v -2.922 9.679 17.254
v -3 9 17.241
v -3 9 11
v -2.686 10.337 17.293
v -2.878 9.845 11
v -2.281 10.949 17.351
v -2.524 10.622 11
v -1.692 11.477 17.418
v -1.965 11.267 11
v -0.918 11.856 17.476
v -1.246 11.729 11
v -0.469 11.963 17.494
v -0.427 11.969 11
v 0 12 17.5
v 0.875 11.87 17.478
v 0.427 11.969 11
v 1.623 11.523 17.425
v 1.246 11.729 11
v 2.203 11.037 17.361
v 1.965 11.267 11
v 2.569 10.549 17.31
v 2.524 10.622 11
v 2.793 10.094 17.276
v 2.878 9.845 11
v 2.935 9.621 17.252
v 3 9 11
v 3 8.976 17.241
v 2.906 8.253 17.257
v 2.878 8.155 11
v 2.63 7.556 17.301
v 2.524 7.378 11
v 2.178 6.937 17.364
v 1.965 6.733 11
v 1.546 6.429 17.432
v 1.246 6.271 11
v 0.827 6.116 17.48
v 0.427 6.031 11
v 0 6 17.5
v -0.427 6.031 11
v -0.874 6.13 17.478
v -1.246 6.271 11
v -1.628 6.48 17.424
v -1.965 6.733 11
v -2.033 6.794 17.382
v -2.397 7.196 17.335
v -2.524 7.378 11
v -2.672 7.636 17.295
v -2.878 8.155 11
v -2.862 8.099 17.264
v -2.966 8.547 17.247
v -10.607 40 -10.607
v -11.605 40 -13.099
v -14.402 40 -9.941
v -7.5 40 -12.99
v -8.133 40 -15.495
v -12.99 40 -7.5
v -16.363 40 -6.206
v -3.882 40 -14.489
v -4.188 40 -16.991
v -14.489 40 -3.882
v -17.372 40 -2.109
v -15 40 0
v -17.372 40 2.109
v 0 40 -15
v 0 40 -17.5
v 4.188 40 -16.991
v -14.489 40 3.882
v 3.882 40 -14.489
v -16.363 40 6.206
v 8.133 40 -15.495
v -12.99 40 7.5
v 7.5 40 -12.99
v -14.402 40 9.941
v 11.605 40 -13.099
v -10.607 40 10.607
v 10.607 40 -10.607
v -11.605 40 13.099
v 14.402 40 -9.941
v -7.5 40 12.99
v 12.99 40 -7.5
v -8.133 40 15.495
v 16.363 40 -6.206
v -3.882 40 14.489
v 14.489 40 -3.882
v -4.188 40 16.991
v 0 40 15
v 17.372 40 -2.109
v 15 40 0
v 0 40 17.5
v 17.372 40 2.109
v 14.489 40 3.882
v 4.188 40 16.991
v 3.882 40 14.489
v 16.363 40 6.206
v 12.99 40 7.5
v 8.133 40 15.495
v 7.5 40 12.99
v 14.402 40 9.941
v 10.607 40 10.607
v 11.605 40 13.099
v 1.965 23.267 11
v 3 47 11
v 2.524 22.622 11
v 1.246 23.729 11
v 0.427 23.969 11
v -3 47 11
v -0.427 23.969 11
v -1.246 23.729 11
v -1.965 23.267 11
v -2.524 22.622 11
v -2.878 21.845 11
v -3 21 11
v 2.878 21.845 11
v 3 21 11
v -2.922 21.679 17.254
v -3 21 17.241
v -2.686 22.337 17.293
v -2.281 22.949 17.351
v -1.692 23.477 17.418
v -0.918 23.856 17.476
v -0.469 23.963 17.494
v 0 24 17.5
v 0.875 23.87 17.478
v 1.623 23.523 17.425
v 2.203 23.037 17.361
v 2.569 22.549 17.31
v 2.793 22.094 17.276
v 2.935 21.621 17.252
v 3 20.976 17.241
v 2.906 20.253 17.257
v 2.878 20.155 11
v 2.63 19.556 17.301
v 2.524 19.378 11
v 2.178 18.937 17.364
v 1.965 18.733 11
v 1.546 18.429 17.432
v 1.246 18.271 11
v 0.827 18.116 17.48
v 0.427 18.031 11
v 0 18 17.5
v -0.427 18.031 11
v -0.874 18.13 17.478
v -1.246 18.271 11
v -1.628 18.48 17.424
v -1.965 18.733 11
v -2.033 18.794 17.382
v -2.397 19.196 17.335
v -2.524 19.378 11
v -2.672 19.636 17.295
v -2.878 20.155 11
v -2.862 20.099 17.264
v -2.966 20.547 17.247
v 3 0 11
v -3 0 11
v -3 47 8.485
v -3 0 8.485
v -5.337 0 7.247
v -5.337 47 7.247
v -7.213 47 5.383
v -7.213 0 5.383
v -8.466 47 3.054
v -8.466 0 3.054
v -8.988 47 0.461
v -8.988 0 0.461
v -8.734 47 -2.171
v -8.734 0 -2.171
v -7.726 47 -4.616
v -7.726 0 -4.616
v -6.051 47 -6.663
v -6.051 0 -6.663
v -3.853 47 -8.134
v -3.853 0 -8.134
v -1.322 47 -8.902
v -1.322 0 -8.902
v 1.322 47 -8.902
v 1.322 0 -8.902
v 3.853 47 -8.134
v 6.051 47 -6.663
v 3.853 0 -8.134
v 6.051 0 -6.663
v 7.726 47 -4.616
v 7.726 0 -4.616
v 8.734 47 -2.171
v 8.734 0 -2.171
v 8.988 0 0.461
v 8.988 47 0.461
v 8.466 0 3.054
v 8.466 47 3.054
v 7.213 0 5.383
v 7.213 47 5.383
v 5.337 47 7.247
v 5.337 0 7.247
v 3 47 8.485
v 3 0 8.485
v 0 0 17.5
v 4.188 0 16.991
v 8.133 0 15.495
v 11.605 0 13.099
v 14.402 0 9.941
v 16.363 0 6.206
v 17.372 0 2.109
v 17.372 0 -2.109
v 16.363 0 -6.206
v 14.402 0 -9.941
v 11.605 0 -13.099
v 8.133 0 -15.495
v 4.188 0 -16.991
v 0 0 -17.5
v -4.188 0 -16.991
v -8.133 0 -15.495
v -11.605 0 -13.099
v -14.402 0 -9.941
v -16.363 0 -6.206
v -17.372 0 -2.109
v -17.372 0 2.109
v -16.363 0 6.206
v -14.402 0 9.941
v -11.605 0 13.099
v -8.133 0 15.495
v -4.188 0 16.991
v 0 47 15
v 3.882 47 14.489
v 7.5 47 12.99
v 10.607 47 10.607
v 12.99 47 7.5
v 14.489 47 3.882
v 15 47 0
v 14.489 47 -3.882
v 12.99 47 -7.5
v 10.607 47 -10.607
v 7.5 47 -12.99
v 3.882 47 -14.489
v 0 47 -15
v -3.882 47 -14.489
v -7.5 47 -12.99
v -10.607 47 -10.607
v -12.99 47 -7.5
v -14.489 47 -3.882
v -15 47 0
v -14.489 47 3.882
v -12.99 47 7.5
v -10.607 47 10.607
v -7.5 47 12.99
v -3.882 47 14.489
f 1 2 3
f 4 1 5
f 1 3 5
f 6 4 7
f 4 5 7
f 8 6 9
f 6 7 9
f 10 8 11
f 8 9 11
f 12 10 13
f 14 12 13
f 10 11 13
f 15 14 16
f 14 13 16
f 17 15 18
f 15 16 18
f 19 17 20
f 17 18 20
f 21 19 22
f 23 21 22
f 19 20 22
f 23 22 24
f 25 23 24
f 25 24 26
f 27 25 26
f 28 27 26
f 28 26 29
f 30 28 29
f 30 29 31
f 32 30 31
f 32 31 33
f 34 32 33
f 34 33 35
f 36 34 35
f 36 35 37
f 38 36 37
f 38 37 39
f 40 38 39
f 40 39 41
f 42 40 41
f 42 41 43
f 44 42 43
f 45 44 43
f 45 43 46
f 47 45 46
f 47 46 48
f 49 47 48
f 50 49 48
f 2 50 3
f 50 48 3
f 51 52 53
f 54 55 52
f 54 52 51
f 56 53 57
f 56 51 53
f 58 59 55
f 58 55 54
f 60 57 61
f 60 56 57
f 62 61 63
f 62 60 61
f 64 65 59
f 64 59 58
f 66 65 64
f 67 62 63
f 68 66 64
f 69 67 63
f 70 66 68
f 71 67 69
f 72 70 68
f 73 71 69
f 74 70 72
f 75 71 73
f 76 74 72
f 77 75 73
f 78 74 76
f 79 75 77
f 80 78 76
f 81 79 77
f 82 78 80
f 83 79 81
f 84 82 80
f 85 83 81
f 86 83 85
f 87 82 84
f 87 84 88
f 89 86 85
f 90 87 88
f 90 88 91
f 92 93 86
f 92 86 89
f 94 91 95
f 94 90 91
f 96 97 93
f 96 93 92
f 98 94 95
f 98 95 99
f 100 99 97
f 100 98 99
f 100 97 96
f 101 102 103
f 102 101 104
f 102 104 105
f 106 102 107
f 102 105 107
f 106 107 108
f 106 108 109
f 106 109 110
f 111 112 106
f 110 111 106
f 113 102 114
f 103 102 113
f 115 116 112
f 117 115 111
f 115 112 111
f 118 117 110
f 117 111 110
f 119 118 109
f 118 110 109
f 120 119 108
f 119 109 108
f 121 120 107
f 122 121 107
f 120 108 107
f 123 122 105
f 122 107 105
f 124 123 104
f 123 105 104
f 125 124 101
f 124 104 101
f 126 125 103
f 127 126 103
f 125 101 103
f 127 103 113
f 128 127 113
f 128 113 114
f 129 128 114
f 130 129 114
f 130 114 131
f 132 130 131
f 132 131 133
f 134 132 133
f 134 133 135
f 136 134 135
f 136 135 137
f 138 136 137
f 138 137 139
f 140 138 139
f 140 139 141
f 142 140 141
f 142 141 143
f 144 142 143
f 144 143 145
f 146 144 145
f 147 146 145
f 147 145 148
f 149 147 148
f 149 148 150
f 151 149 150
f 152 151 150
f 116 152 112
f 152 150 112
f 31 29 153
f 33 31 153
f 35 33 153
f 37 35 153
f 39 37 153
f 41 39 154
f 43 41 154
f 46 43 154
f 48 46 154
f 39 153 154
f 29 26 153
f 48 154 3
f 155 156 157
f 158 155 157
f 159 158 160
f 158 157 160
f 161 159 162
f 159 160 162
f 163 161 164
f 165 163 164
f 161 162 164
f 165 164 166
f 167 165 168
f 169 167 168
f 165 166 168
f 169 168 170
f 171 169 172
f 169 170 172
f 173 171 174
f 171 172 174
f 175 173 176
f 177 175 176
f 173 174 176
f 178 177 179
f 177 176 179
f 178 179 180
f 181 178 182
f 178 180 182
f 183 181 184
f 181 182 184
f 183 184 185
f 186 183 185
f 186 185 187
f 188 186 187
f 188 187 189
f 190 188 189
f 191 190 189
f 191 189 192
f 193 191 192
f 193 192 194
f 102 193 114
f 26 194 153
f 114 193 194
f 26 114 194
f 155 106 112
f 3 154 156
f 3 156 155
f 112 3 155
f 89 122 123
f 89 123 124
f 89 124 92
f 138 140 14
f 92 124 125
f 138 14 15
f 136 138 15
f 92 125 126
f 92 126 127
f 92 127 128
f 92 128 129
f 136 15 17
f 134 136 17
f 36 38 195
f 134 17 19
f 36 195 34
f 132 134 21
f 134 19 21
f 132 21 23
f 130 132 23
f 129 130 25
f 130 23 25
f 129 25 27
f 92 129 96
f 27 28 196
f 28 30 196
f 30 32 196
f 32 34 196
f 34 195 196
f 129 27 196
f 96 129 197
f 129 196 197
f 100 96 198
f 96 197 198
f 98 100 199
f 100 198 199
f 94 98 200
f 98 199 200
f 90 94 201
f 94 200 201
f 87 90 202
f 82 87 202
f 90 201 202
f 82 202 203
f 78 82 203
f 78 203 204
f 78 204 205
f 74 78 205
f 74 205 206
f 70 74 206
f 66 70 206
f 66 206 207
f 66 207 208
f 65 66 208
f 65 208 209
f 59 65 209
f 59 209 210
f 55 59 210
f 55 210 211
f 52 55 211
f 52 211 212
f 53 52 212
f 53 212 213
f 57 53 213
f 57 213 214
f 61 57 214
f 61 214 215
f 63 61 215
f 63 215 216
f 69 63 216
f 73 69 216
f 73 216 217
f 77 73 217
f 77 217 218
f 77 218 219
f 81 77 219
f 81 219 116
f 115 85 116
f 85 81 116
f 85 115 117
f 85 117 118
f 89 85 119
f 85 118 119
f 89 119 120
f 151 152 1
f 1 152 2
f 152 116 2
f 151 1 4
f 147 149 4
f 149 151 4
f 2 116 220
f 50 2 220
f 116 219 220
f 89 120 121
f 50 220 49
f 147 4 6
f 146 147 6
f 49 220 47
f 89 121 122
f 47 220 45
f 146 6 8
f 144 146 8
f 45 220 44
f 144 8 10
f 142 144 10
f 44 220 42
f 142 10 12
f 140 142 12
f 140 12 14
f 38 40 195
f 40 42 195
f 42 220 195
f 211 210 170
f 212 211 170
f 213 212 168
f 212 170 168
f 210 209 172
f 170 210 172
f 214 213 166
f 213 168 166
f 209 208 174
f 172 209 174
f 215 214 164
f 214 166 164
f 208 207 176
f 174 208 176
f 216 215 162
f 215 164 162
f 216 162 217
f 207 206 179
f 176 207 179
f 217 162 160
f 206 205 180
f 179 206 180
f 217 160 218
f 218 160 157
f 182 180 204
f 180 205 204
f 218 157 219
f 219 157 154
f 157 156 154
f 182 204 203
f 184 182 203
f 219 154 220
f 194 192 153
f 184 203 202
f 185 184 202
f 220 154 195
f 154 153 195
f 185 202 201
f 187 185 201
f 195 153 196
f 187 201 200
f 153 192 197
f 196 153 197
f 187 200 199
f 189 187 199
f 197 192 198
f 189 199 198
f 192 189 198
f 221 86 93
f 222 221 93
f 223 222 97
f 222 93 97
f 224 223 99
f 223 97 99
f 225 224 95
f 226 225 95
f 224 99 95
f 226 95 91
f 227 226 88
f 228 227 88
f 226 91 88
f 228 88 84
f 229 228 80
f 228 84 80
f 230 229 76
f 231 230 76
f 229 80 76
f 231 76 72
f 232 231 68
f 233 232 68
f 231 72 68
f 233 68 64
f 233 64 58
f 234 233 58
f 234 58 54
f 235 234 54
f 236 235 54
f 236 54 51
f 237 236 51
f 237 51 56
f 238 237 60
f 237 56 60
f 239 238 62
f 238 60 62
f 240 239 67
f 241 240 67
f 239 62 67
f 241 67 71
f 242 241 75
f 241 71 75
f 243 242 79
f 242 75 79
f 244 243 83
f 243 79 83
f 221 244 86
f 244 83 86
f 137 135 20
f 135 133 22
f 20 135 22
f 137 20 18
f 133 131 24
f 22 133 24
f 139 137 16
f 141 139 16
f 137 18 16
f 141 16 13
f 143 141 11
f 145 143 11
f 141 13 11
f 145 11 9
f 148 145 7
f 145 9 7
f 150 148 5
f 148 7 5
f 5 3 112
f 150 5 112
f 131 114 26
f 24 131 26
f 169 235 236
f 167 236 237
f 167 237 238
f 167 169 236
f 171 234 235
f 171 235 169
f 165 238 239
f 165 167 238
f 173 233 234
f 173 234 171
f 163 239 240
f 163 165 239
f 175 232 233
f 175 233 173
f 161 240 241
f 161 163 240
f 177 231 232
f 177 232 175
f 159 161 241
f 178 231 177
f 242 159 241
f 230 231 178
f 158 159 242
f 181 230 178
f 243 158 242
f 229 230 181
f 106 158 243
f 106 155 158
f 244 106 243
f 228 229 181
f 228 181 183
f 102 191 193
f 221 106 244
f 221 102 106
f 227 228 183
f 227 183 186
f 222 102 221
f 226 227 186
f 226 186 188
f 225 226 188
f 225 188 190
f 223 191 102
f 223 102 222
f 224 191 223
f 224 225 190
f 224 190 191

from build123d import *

# Parameters (mm, degrees)
SKETCH1_R               = 17.5
BOSS_EXTRUDE1_DEPTH     = 47
CUT_EXTRUDE1_START      = -7
SKETCH2_R               = 17.5
SKETCH2_R_2             = 15
CUT_EXTRUDE1_DEPTH      = 7
CUT_EXTRUDE2_DEPTH      = 54.117793629
CUT_EXTRUDE3_REACH      = 59.684
CUT_EXTRUDE3_END_RADIUS = 17.5
SKETCH4_R               = 3


with BuildPart() as part:
    # Sketch1 → Boss-Extrude1 (new body)
    with BuildSketch(Plane(origin=(0, 0, 0), x_dir=(1, 0, 0), z_dir=(0, 1, 0))):
        with Locations(Location((0, 0, 0), (0, 0, 270))):
            Circle(SKETCH1_R)
    extrude(amount=BOSS_EXTRUDE1_DEPTH)

    # Sketch2 → Cut-Extrude1 (cut)
    with BuildSketch(Plane(origin=(0, 47, 0), x_dir=(1, 0, 0), z_dir=(0, 1, 0)).offset(CUT_EXTRUDE1_START)):
        with Locations(Location((0, 0, 0), (0, 0, 270))):
            Circle(SKETCH2_R)
        with Locations(Location((0, 0, 0), (0, 0, 270))):
            Circle(SKETCH2_R_2, mode=Mode.SUBTRACT)
    extrude(amount=CUT_EXTRUDE1_DEPTH, mode=Mode.SUBTRACT)

    # Sketch3 → Cut-Extrude2 (cut, through all)
    with BuildSketch(Plane.XZ):
        with BuildLine():
            Line((0, 11), (-3, 11))
            Line((-3, 11), (-3, 8.485281374))
            ThreePointArc((-3, 8.485281374), (0, -9), (3, 8.485281374))
            Line((3, 8.485281374), (3, 11))
            Line((3, 11), (0, 11))
        make_face()
    extrude(amount=-CUT_EXTRUDE2_DEPTH, mode=Mode.SUBTRACT)

    # Cut-Extrude3: up to this cylinder (the profile starts inside it)
    cut_extrude3_end = Plane(origin=(0, 15, 0), z_dir=(0, -1, 0)) * Cylinder(CUT_EXTRUDE3_END_RADIUS, 167.368, mode=Mode.PRIVATE)
    # Sketch4 → Cut-Extrude3 (cut, up to the surface)
    with BuildSketch(Plane(origin=(0, 0, 11), x_dir=(-1, 0, 0), z_dir=(0, 0, -1)), mode=Mode.PRIVATE) as cut_extrude3_sk1:
        with Locations((0, 9)):
            Circle(SKETCH4_R)
    cut_extrude3_tool1 = extrude(cut_extrude3_sk1.sketch, amount=-CUT_EXTRUDE3_REACH, mode=Mode.PRIVATE) & cut_extrude3_end
    add(cut_extrude3_tool1.solids().sort_by_distance((0, 9, 11))[0], mode=Mode.SUBTRACT)
    # Sketch4 → Cut-Extrude3 (cut, up to the surface)
    with BuildSketch(Plane(origin=(0, 0, 11), x_dir=(-1, 0, 0), z_dir=(0, 0, -1)), mode=Mode.PRIVATE) as cut_extrude3_sk2:
        with Locations((0, 21)):
            Circle(SKETCH4_R)
    cut_extrude3_tool2 = extrude(cut_extrude3_sk2.sketch, amount=-CUT_EXTRUDE3_REACH, mode=Mode.PRIVATE) & cut_extrude3_end
    add(cut_extrude3_tool2.solids().sort_by_distance((0, 21, 11))[0], mode=Mode.SUBTRACT)


solid = part.part
